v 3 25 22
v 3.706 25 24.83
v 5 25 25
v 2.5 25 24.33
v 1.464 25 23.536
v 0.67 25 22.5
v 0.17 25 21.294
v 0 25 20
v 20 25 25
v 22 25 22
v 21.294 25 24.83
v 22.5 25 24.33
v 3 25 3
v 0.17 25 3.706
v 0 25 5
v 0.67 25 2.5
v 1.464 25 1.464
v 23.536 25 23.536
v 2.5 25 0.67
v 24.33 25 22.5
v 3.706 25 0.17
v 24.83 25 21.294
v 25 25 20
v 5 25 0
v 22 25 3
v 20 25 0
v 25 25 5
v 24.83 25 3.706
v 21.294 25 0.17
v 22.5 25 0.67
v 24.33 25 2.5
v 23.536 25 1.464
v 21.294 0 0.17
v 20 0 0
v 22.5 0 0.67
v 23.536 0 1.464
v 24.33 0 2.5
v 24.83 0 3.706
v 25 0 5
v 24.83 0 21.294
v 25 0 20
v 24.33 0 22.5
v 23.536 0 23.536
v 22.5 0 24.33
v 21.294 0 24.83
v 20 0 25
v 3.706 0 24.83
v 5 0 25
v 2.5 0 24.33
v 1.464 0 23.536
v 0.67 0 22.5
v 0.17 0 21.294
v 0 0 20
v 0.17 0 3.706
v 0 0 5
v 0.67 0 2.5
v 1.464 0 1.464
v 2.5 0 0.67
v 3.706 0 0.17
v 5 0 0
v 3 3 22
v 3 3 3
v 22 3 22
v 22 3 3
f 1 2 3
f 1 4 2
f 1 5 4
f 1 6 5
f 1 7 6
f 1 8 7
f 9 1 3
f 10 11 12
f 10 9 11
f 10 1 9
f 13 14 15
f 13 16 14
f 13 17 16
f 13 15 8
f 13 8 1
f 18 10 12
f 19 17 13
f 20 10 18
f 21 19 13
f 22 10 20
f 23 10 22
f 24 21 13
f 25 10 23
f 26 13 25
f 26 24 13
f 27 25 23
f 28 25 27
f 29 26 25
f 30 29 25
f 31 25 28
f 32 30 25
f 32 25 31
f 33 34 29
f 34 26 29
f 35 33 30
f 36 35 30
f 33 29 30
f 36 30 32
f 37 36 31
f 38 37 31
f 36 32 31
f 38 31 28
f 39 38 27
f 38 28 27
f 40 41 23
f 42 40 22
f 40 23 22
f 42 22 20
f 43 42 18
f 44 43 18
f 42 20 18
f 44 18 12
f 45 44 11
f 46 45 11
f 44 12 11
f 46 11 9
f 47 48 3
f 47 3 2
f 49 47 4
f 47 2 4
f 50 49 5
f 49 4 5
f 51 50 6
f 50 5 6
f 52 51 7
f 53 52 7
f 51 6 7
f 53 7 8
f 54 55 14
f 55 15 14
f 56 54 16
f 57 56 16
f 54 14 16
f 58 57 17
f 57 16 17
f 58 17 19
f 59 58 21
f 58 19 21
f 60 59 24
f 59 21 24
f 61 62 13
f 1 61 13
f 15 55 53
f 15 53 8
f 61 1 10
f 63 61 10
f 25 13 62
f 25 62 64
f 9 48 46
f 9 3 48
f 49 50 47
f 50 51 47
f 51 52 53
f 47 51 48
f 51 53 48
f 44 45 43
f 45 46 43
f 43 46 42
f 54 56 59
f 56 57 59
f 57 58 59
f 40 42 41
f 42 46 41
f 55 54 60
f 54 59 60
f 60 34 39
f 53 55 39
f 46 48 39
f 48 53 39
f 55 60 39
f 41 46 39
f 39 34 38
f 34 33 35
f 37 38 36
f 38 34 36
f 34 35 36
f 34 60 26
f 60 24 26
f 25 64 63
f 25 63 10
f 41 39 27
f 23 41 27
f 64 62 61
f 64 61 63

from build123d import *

# Parameters (mm, degrees)
F0_W     = 25
F0_H     = 25
F1_DEPTH = 25
F2_T     = -3
F3_R     = 5
F4_R     = 5
F5_R     = 5
F6_R     = 5


with BuildPart() as f1:
    # F0 (on Top) → F1 (new body)
    with BuildSketch(Plane.XY):
        with Locations((12.5, 12.5)):
            Rectangle(F0_W, F0_H)
    extrude(amount=F1_DEPTH)

    # F2
    f2_openings = [f1.faces().sort_by_distance(p)[0] for p in [
        (12.5, 25, 12.5),
    ]]
    offset(amount=F2_T, openings=f2_openings)

    # F3
    f3_edges = [f1.edges().sort_by_distance(p)[0] for p in [
        (25, 12.5, 25),
    ]]
    fillet(f3_edges, radius=F3_R)

    # F4
    f4_edges = [f1.edges().sort_by_distance(p)[0] for p in [
        (0, 12.5, 25),
    ]]
    fillet(f4_edges, radius=F4_R)

    # F5
    f5_edges = [f1.edges().sort_by_distance(p)[0] for p in [
        (0, 12.5, 0),
    ]]
    fillet(f5_edges, radius=F5_R)

    # F6
    f6_edges = [f1.edges().sort_by_distance(p)[0] for p in [
        (25, 12.5, 0),
    ]]
    fillet(f6_edges, radius=F6_R)


solid = f1.part
